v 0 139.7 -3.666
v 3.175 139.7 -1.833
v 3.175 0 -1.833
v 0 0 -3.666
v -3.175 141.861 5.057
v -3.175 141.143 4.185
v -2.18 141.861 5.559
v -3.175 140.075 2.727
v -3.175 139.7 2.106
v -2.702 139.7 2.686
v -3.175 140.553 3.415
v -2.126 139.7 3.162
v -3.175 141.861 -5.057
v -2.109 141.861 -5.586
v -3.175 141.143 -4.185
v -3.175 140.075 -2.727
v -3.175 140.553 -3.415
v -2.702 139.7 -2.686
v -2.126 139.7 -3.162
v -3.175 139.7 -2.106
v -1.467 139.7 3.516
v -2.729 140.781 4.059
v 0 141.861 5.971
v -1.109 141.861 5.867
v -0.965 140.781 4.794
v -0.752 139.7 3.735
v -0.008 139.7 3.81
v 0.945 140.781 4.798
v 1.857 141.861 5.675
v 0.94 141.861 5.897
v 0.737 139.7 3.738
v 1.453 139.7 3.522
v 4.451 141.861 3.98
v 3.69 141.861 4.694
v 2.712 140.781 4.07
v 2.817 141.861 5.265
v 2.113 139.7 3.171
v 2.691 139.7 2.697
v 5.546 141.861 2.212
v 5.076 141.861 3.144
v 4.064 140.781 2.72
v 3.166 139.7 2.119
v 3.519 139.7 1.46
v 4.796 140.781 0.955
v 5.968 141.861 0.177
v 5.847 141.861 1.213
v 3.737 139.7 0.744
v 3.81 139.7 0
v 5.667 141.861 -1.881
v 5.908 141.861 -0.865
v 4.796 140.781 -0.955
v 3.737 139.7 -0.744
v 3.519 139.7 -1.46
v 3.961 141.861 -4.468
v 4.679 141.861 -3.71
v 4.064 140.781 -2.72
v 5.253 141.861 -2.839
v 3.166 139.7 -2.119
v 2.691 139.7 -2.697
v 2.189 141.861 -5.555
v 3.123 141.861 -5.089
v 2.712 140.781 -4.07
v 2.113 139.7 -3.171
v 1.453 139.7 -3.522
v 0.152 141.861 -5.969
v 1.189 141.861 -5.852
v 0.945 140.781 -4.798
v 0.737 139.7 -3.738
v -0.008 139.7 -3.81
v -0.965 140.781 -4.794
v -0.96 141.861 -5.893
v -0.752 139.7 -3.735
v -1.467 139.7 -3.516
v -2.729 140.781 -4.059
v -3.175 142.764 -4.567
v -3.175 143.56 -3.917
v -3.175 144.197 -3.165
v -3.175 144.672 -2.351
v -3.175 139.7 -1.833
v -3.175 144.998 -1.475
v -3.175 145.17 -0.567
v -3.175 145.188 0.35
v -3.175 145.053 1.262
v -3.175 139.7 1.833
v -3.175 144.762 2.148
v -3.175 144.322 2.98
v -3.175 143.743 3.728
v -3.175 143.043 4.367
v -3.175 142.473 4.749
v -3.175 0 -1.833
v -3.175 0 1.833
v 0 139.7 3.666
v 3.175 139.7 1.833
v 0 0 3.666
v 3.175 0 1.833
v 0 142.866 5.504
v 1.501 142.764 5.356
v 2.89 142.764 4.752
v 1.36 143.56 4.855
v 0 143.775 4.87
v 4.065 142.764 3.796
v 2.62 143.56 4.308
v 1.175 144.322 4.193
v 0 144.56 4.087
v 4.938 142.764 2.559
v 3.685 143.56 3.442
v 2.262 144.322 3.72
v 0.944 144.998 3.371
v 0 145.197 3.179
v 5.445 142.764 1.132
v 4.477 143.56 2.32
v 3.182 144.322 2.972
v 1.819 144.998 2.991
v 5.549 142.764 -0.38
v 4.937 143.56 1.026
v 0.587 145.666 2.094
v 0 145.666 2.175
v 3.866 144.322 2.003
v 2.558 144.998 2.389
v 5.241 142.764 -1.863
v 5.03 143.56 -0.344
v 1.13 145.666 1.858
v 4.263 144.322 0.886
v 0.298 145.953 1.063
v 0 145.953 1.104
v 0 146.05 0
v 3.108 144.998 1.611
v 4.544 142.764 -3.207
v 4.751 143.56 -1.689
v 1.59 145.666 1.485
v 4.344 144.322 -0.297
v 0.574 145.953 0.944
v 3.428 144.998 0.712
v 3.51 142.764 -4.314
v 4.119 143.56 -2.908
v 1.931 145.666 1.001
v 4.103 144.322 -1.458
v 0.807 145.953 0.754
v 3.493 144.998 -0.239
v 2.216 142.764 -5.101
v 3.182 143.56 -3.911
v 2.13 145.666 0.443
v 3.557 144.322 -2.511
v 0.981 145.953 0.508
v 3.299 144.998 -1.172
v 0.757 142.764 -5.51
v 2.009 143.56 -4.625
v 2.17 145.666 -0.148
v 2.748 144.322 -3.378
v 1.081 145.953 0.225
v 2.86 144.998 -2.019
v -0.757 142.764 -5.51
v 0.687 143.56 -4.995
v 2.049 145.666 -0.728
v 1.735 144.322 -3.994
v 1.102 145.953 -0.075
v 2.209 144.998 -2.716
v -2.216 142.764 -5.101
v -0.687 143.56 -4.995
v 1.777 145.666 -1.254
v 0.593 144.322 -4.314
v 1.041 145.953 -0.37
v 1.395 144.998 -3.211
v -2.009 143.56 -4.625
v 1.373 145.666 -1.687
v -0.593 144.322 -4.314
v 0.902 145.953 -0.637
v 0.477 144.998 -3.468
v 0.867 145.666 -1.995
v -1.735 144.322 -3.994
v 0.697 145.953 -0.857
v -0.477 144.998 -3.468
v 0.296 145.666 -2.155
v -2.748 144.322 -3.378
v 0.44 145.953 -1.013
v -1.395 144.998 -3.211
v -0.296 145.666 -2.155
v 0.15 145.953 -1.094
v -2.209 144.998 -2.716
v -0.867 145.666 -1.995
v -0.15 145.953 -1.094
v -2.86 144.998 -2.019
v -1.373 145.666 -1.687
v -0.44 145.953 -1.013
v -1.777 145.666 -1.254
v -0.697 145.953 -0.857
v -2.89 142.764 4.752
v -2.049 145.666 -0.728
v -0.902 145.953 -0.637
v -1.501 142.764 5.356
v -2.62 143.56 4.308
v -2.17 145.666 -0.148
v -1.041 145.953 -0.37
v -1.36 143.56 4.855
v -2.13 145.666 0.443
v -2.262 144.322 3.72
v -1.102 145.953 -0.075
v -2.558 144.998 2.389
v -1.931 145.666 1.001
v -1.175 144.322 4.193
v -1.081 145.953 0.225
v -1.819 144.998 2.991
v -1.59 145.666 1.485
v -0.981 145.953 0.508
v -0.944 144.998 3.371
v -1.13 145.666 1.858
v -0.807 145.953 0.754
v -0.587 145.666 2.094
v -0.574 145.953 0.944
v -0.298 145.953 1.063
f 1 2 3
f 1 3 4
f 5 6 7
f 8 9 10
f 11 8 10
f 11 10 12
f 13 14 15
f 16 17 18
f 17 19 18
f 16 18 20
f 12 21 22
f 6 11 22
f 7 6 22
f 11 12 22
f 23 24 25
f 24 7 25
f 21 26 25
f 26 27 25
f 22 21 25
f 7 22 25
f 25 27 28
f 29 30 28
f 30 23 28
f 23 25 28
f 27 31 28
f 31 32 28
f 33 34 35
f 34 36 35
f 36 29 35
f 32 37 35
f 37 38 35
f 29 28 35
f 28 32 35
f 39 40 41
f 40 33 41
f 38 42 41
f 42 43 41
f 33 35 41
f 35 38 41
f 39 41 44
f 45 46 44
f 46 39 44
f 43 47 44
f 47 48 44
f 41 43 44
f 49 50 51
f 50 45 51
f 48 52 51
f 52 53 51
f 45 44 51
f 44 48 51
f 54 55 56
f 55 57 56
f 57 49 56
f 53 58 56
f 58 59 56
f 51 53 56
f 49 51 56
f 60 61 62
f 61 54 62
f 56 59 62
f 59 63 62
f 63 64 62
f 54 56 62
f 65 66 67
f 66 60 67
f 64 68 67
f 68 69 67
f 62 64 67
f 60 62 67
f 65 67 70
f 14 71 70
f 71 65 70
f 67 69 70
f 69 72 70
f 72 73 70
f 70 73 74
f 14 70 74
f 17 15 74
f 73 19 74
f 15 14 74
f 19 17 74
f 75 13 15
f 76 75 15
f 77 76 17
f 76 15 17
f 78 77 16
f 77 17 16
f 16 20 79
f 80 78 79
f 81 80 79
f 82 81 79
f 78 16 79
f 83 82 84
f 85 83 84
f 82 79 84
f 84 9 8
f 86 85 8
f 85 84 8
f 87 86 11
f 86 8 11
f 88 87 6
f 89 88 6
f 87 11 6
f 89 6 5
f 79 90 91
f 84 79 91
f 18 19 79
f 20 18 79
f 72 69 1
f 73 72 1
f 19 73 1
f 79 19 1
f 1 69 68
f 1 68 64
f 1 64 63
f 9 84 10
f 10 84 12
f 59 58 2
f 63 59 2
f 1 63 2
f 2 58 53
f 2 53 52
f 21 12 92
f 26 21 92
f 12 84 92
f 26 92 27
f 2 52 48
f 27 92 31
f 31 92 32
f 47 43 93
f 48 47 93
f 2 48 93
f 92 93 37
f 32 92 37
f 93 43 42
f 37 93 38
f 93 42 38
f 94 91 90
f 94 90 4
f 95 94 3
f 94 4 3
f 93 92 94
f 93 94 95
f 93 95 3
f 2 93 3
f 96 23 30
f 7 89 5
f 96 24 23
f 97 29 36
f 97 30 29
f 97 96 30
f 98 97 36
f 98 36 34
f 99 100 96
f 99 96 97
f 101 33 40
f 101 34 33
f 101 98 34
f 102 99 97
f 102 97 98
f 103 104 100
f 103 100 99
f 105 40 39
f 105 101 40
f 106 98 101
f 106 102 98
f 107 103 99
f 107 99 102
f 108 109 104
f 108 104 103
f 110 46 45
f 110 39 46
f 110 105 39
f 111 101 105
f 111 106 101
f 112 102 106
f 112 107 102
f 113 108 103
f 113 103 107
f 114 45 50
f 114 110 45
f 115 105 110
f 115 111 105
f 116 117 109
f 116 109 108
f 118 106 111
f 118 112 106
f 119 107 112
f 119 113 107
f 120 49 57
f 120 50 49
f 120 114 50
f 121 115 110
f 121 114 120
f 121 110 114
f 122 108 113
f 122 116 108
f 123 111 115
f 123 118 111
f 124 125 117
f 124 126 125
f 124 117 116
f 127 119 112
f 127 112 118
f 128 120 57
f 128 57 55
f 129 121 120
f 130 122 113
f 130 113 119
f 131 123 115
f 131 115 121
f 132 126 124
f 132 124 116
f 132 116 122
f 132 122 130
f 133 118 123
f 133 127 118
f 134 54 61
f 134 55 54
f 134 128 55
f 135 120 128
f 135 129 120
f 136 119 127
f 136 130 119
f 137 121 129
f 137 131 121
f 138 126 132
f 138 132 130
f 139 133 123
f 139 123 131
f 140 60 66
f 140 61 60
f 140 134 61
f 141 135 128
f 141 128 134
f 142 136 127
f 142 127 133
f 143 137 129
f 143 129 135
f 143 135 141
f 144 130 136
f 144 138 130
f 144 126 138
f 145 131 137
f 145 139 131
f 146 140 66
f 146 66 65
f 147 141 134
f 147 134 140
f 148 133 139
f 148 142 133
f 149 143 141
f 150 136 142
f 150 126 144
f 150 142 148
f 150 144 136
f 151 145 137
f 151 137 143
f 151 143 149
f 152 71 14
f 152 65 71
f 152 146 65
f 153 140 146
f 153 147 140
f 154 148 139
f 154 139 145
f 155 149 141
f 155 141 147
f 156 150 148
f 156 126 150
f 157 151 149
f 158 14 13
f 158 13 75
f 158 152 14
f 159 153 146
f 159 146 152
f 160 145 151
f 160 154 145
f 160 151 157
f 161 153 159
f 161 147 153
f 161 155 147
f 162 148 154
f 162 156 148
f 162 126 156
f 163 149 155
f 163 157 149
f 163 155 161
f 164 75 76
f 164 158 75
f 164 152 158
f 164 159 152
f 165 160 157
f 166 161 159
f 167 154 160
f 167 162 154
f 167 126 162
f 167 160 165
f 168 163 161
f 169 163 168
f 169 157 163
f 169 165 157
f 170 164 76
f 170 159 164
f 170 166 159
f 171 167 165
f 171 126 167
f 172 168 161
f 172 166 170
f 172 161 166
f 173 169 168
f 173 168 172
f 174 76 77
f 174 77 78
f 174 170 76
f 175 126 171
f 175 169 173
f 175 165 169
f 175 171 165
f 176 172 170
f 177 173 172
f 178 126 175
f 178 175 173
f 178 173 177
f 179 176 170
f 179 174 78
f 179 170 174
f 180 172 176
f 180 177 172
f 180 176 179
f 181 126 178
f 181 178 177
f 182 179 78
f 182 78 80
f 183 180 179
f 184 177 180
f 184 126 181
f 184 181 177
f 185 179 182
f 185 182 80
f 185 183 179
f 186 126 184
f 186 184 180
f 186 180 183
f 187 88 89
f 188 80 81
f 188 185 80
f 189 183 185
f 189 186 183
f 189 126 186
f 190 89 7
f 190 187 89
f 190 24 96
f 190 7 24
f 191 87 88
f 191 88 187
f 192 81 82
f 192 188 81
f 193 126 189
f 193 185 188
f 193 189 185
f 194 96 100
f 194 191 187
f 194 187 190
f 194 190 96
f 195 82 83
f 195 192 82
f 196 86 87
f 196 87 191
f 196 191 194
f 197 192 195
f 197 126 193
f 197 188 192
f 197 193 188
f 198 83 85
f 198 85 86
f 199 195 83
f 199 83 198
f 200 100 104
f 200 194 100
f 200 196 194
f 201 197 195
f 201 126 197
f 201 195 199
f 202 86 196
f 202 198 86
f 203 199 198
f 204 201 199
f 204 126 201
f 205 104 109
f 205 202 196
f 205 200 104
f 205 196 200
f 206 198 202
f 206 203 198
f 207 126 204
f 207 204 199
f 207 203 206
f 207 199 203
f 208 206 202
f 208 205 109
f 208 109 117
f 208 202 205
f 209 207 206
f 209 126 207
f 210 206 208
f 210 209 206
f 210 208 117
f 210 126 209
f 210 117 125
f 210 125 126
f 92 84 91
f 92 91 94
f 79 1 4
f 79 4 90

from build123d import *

# Parameters (mm, degrees)
BOSS_EXTRUDE1_DEPTH = 139.7
SKETCH3_R           = 6.35
BOSS_EXTRUDE2_DEPTH = 6.35
FILLET1_R           = 6.35
CHAMFER1_SIZE       = 2.54
SKETCH4_W           = 9.672441956
SKETCH4_H           = 22.08614384
CUT_EXTRUDE1_DEPTH  = 152.4


# Some blends are built 0.0001 mm under size
with BuildPart() as part:
    # Sketch1 → Boss-Extrude1 (new body)
    with BuildSketch(Plane(origin=(0, 0, 0), x_dir=(1, 0, 0), z_dir=(0, 1, 0))):
        Polygon((0, 3.666174209), (-3.175, 1.833087105), (-3.175, -1.833087105), (0, -3.666174209), (3.175, -1.833087105), (3.175, 1.833087105), align=None)
    extrude(amount=BOSS_EXTRUDE1_DEPTH)

    # Sketch3 → Boss-Extrude2 (add)
    with BuildSketch(Plane(origin=(0, 139.7, 0), x_dir=(1, 0, 0), z_dir=(0, 1, 0))):
        with Locations(Location((0, 0, 0), (0, 0, 270))):
            Circle(SKETCH3_R)
    extrude(amount=BOSS_EXTRUDE2_DEPTH)

    # Fillet1
    fillet1_edges = [part.edges().sort_by_distance(p)[0] for p in [
        (0, 146.05, -6.35),
    ]]
    fillet(fillet1_edges, radius=FILLET1_R - 0.0001)  # a hair under: the kernel refuses the full size

    # Chamfer1
    # the kernel refuses this chamfer: 2.54 mm, written as the material it takes off along each edge
    with BuildSketch(Plane(origin=(0, 139.7, 0), x_dir=(0, 0, 1), z_dir=(-1, 0, 0))) as chamfer1_piece_1:
        Polygon((6.35, CHAMFER1_SIZE), (6.35 - CHAMFER1_SIZE, 0), (6.35, 0), align=None)
    revolve(axis=Axis((0, 139.7, 0), (0, 1, 0)), mode=Mode.SUBTRACT)

    # Sketch4 → Cut-Extrude1 (cut)
    with BuildSketch(Plane.XZ):
        with Locations((-8.011220978, 1.321657353)):
            Rectangle(SKETCH4_W, SKETCH4_H)
    extrude(amount=-CUT_EXTRUDE1_DEPTH, mode=Mode.SUBTRACT)


solid = part.part
